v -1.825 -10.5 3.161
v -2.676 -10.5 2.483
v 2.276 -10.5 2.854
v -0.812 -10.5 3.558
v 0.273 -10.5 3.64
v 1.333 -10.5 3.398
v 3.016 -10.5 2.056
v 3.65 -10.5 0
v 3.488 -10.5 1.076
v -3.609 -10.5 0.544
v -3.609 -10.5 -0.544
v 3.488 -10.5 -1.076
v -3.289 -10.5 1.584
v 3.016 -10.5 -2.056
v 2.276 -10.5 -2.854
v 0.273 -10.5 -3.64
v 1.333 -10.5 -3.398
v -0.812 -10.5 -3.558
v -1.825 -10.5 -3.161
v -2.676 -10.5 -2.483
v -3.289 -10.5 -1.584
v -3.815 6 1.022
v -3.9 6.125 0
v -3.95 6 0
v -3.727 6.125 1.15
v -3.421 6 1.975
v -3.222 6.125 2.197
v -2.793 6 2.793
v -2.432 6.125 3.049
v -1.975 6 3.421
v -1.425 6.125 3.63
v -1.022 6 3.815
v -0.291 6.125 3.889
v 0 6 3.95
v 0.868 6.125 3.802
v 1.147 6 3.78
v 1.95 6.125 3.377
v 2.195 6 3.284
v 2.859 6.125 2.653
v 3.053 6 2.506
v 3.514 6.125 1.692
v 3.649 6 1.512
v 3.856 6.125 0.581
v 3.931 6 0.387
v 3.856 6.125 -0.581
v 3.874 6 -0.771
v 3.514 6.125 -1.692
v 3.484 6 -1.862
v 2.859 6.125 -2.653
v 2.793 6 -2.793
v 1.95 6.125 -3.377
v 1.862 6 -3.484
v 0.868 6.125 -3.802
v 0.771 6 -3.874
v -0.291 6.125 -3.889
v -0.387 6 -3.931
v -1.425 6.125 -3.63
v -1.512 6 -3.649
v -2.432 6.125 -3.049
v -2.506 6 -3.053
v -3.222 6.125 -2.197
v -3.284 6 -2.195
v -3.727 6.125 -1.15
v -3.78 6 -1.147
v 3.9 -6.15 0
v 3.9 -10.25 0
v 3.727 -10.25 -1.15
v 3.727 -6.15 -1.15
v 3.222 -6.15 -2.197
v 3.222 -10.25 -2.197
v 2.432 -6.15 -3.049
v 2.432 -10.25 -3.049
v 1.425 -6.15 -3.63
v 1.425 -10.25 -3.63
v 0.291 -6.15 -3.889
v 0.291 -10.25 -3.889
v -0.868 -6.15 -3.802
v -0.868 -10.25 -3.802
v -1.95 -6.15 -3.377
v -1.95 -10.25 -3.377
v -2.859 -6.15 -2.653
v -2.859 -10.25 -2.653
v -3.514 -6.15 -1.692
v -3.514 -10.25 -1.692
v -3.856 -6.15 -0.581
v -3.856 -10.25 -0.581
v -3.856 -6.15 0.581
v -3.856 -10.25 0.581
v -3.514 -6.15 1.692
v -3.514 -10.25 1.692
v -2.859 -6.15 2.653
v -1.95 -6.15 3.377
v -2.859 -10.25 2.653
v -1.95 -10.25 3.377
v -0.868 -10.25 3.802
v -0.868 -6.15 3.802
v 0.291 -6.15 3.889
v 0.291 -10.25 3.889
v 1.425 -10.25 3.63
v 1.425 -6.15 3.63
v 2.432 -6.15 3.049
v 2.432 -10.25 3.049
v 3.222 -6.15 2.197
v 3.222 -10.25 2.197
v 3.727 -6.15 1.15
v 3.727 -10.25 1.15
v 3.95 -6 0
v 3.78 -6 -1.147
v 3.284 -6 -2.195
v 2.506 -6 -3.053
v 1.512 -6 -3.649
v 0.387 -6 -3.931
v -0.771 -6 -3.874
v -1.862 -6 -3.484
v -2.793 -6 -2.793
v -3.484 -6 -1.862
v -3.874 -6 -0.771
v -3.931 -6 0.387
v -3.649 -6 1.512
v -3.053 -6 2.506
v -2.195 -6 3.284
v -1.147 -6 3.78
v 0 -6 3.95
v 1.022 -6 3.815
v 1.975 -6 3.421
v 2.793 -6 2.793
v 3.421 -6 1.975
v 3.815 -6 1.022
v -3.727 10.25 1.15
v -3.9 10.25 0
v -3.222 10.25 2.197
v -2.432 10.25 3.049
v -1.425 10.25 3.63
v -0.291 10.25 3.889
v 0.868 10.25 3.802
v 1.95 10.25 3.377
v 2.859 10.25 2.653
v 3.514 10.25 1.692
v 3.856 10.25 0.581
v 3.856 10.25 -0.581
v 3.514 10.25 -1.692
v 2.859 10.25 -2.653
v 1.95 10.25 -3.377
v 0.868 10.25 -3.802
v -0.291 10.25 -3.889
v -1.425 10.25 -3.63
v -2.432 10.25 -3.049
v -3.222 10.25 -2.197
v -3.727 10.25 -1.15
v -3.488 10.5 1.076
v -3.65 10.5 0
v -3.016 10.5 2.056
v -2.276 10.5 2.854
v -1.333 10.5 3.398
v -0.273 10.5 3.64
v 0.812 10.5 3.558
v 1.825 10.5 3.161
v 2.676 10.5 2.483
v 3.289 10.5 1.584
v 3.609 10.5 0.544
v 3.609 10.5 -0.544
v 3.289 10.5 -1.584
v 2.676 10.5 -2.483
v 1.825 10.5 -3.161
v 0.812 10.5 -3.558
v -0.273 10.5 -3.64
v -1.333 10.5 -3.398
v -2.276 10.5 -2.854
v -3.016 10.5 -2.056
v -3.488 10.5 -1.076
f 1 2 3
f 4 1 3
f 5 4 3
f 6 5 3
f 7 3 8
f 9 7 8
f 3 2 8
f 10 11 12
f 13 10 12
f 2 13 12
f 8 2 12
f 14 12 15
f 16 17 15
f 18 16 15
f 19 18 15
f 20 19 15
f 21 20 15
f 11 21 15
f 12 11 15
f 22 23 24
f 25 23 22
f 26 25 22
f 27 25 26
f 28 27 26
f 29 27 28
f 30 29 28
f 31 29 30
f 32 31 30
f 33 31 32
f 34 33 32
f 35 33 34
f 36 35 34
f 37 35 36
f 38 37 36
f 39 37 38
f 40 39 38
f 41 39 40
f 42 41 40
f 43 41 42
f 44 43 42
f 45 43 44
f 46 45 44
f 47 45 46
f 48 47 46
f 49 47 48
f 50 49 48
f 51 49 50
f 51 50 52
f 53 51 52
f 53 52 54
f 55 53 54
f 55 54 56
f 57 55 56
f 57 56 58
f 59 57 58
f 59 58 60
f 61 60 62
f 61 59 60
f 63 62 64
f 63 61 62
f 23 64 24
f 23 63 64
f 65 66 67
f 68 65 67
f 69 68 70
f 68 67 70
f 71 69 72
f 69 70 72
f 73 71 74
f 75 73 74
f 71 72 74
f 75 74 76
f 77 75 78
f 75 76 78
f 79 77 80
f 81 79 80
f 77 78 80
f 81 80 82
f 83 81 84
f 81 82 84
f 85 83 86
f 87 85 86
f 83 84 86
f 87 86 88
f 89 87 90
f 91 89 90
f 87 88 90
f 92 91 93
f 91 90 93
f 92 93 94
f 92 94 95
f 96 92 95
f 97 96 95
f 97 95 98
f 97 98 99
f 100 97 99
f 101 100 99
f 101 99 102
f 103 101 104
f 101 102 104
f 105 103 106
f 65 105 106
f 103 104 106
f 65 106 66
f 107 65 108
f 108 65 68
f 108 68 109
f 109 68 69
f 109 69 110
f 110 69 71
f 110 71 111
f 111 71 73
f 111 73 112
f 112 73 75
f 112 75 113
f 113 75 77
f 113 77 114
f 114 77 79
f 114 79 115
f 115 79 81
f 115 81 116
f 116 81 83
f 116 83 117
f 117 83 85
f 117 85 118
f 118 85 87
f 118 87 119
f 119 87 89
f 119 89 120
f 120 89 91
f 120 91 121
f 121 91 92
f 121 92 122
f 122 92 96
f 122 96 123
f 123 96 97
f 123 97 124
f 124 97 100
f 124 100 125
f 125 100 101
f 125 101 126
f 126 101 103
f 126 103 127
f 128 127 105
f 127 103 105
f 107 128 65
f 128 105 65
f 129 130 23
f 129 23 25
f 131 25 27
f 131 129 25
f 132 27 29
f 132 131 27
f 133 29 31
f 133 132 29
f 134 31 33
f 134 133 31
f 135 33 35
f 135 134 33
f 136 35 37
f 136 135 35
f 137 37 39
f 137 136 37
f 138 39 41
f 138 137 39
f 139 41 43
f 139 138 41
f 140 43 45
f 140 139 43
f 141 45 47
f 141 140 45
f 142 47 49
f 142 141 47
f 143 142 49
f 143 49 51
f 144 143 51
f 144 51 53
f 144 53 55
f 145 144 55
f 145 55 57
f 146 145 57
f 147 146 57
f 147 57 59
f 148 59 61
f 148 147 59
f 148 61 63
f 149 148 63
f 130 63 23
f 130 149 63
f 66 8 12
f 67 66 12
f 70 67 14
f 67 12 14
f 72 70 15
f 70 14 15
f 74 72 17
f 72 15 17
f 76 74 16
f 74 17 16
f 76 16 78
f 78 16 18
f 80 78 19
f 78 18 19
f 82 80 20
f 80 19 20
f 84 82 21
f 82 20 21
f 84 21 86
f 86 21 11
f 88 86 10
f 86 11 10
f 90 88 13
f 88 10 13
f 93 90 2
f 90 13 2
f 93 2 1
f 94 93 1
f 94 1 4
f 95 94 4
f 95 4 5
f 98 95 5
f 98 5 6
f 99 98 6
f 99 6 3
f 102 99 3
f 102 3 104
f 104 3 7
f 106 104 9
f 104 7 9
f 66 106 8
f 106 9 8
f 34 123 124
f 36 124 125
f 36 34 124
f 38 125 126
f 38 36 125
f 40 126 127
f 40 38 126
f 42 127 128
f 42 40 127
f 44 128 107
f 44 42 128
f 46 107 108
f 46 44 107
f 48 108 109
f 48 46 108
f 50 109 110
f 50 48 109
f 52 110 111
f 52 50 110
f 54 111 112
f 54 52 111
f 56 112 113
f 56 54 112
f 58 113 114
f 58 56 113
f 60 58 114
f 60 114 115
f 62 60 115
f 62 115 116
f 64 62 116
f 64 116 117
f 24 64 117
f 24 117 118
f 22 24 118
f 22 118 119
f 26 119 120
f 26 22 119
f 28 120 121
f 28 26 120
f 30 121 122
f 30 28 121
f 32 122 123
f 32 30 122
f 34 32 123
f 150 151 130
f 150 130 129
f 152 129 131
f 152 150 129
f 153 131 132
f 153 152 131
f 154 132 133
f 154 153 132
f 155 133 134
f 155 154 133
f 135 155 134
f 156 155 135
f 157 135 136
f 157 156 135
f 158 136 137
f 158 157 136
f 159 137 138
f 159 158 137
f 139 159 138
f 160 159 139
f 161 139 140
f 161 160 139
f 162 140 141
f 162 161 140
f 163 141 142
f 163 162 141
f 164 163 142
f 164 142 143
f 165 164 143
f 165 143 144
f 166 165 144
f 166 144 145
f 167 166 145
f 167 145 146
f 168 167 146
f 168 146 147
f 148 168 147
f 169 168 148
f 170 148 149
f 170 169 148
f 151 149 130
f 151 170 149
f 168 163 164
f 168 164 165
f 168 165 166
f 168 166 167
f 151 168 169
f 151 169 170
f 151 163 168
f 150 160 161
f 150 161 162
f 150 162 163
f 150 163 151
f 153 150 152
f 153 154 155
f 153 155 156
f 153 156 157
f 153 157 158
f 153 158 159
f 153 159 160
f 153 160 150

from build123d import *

# Parameters (mm, degrees)
SKETCH1_R           = 3.95
BOSS_EXTRUDE1_DEPTH = 6
CHAMFER1_SIZE       = 0.25


with BuildPart() as part:
    # Sketch1 → Boss-Extrude1 (new, symmetric)
    with BuildSketch(Plane(origin=(0, 0, 0), x_dir=(1, 0, 0), z_dir=(0, 1, 0))):
        with Locations(Location((0, 0, 0), (0, 0, 270))):
            Circle(SKETCH1_R)
    extrude(amount=BOSS_EXTRUDE1_DEPTH, both=True)

    # Sketch2 → Revolve2 (revolve)
    with BuildSketch(Plane.XY, mode=Mode.PRIVATE) as revolve2_sk:
        Polygon((0, -10.5), (0, -6), (-3.95, -6), (-3.9, -6.15), (-3.9, -10.5), align=None)
        Polygon((0, 10.5), (0, 6), (3.95, 6), (3.9, 6.125), (3.9, 10.5), align=None)
    revolve(revolve2_sk.sketch.rotate(Axis((0, -10.5, 0), (0, 1, 0)), 180), axis=Axis((0, -10.5, 0), (0, 1, 0)))

    # Chamfer1
    chamfer1_edges = [part.edges().sort_by_distance(p)[0] for p in [
        (-3.9, -10.5, 0),
        (3.9, 10.5, 0),
    ]]
    chamfer(chamfer1_edges, length=CHAMFER1_SIZE)


solid = part.part
